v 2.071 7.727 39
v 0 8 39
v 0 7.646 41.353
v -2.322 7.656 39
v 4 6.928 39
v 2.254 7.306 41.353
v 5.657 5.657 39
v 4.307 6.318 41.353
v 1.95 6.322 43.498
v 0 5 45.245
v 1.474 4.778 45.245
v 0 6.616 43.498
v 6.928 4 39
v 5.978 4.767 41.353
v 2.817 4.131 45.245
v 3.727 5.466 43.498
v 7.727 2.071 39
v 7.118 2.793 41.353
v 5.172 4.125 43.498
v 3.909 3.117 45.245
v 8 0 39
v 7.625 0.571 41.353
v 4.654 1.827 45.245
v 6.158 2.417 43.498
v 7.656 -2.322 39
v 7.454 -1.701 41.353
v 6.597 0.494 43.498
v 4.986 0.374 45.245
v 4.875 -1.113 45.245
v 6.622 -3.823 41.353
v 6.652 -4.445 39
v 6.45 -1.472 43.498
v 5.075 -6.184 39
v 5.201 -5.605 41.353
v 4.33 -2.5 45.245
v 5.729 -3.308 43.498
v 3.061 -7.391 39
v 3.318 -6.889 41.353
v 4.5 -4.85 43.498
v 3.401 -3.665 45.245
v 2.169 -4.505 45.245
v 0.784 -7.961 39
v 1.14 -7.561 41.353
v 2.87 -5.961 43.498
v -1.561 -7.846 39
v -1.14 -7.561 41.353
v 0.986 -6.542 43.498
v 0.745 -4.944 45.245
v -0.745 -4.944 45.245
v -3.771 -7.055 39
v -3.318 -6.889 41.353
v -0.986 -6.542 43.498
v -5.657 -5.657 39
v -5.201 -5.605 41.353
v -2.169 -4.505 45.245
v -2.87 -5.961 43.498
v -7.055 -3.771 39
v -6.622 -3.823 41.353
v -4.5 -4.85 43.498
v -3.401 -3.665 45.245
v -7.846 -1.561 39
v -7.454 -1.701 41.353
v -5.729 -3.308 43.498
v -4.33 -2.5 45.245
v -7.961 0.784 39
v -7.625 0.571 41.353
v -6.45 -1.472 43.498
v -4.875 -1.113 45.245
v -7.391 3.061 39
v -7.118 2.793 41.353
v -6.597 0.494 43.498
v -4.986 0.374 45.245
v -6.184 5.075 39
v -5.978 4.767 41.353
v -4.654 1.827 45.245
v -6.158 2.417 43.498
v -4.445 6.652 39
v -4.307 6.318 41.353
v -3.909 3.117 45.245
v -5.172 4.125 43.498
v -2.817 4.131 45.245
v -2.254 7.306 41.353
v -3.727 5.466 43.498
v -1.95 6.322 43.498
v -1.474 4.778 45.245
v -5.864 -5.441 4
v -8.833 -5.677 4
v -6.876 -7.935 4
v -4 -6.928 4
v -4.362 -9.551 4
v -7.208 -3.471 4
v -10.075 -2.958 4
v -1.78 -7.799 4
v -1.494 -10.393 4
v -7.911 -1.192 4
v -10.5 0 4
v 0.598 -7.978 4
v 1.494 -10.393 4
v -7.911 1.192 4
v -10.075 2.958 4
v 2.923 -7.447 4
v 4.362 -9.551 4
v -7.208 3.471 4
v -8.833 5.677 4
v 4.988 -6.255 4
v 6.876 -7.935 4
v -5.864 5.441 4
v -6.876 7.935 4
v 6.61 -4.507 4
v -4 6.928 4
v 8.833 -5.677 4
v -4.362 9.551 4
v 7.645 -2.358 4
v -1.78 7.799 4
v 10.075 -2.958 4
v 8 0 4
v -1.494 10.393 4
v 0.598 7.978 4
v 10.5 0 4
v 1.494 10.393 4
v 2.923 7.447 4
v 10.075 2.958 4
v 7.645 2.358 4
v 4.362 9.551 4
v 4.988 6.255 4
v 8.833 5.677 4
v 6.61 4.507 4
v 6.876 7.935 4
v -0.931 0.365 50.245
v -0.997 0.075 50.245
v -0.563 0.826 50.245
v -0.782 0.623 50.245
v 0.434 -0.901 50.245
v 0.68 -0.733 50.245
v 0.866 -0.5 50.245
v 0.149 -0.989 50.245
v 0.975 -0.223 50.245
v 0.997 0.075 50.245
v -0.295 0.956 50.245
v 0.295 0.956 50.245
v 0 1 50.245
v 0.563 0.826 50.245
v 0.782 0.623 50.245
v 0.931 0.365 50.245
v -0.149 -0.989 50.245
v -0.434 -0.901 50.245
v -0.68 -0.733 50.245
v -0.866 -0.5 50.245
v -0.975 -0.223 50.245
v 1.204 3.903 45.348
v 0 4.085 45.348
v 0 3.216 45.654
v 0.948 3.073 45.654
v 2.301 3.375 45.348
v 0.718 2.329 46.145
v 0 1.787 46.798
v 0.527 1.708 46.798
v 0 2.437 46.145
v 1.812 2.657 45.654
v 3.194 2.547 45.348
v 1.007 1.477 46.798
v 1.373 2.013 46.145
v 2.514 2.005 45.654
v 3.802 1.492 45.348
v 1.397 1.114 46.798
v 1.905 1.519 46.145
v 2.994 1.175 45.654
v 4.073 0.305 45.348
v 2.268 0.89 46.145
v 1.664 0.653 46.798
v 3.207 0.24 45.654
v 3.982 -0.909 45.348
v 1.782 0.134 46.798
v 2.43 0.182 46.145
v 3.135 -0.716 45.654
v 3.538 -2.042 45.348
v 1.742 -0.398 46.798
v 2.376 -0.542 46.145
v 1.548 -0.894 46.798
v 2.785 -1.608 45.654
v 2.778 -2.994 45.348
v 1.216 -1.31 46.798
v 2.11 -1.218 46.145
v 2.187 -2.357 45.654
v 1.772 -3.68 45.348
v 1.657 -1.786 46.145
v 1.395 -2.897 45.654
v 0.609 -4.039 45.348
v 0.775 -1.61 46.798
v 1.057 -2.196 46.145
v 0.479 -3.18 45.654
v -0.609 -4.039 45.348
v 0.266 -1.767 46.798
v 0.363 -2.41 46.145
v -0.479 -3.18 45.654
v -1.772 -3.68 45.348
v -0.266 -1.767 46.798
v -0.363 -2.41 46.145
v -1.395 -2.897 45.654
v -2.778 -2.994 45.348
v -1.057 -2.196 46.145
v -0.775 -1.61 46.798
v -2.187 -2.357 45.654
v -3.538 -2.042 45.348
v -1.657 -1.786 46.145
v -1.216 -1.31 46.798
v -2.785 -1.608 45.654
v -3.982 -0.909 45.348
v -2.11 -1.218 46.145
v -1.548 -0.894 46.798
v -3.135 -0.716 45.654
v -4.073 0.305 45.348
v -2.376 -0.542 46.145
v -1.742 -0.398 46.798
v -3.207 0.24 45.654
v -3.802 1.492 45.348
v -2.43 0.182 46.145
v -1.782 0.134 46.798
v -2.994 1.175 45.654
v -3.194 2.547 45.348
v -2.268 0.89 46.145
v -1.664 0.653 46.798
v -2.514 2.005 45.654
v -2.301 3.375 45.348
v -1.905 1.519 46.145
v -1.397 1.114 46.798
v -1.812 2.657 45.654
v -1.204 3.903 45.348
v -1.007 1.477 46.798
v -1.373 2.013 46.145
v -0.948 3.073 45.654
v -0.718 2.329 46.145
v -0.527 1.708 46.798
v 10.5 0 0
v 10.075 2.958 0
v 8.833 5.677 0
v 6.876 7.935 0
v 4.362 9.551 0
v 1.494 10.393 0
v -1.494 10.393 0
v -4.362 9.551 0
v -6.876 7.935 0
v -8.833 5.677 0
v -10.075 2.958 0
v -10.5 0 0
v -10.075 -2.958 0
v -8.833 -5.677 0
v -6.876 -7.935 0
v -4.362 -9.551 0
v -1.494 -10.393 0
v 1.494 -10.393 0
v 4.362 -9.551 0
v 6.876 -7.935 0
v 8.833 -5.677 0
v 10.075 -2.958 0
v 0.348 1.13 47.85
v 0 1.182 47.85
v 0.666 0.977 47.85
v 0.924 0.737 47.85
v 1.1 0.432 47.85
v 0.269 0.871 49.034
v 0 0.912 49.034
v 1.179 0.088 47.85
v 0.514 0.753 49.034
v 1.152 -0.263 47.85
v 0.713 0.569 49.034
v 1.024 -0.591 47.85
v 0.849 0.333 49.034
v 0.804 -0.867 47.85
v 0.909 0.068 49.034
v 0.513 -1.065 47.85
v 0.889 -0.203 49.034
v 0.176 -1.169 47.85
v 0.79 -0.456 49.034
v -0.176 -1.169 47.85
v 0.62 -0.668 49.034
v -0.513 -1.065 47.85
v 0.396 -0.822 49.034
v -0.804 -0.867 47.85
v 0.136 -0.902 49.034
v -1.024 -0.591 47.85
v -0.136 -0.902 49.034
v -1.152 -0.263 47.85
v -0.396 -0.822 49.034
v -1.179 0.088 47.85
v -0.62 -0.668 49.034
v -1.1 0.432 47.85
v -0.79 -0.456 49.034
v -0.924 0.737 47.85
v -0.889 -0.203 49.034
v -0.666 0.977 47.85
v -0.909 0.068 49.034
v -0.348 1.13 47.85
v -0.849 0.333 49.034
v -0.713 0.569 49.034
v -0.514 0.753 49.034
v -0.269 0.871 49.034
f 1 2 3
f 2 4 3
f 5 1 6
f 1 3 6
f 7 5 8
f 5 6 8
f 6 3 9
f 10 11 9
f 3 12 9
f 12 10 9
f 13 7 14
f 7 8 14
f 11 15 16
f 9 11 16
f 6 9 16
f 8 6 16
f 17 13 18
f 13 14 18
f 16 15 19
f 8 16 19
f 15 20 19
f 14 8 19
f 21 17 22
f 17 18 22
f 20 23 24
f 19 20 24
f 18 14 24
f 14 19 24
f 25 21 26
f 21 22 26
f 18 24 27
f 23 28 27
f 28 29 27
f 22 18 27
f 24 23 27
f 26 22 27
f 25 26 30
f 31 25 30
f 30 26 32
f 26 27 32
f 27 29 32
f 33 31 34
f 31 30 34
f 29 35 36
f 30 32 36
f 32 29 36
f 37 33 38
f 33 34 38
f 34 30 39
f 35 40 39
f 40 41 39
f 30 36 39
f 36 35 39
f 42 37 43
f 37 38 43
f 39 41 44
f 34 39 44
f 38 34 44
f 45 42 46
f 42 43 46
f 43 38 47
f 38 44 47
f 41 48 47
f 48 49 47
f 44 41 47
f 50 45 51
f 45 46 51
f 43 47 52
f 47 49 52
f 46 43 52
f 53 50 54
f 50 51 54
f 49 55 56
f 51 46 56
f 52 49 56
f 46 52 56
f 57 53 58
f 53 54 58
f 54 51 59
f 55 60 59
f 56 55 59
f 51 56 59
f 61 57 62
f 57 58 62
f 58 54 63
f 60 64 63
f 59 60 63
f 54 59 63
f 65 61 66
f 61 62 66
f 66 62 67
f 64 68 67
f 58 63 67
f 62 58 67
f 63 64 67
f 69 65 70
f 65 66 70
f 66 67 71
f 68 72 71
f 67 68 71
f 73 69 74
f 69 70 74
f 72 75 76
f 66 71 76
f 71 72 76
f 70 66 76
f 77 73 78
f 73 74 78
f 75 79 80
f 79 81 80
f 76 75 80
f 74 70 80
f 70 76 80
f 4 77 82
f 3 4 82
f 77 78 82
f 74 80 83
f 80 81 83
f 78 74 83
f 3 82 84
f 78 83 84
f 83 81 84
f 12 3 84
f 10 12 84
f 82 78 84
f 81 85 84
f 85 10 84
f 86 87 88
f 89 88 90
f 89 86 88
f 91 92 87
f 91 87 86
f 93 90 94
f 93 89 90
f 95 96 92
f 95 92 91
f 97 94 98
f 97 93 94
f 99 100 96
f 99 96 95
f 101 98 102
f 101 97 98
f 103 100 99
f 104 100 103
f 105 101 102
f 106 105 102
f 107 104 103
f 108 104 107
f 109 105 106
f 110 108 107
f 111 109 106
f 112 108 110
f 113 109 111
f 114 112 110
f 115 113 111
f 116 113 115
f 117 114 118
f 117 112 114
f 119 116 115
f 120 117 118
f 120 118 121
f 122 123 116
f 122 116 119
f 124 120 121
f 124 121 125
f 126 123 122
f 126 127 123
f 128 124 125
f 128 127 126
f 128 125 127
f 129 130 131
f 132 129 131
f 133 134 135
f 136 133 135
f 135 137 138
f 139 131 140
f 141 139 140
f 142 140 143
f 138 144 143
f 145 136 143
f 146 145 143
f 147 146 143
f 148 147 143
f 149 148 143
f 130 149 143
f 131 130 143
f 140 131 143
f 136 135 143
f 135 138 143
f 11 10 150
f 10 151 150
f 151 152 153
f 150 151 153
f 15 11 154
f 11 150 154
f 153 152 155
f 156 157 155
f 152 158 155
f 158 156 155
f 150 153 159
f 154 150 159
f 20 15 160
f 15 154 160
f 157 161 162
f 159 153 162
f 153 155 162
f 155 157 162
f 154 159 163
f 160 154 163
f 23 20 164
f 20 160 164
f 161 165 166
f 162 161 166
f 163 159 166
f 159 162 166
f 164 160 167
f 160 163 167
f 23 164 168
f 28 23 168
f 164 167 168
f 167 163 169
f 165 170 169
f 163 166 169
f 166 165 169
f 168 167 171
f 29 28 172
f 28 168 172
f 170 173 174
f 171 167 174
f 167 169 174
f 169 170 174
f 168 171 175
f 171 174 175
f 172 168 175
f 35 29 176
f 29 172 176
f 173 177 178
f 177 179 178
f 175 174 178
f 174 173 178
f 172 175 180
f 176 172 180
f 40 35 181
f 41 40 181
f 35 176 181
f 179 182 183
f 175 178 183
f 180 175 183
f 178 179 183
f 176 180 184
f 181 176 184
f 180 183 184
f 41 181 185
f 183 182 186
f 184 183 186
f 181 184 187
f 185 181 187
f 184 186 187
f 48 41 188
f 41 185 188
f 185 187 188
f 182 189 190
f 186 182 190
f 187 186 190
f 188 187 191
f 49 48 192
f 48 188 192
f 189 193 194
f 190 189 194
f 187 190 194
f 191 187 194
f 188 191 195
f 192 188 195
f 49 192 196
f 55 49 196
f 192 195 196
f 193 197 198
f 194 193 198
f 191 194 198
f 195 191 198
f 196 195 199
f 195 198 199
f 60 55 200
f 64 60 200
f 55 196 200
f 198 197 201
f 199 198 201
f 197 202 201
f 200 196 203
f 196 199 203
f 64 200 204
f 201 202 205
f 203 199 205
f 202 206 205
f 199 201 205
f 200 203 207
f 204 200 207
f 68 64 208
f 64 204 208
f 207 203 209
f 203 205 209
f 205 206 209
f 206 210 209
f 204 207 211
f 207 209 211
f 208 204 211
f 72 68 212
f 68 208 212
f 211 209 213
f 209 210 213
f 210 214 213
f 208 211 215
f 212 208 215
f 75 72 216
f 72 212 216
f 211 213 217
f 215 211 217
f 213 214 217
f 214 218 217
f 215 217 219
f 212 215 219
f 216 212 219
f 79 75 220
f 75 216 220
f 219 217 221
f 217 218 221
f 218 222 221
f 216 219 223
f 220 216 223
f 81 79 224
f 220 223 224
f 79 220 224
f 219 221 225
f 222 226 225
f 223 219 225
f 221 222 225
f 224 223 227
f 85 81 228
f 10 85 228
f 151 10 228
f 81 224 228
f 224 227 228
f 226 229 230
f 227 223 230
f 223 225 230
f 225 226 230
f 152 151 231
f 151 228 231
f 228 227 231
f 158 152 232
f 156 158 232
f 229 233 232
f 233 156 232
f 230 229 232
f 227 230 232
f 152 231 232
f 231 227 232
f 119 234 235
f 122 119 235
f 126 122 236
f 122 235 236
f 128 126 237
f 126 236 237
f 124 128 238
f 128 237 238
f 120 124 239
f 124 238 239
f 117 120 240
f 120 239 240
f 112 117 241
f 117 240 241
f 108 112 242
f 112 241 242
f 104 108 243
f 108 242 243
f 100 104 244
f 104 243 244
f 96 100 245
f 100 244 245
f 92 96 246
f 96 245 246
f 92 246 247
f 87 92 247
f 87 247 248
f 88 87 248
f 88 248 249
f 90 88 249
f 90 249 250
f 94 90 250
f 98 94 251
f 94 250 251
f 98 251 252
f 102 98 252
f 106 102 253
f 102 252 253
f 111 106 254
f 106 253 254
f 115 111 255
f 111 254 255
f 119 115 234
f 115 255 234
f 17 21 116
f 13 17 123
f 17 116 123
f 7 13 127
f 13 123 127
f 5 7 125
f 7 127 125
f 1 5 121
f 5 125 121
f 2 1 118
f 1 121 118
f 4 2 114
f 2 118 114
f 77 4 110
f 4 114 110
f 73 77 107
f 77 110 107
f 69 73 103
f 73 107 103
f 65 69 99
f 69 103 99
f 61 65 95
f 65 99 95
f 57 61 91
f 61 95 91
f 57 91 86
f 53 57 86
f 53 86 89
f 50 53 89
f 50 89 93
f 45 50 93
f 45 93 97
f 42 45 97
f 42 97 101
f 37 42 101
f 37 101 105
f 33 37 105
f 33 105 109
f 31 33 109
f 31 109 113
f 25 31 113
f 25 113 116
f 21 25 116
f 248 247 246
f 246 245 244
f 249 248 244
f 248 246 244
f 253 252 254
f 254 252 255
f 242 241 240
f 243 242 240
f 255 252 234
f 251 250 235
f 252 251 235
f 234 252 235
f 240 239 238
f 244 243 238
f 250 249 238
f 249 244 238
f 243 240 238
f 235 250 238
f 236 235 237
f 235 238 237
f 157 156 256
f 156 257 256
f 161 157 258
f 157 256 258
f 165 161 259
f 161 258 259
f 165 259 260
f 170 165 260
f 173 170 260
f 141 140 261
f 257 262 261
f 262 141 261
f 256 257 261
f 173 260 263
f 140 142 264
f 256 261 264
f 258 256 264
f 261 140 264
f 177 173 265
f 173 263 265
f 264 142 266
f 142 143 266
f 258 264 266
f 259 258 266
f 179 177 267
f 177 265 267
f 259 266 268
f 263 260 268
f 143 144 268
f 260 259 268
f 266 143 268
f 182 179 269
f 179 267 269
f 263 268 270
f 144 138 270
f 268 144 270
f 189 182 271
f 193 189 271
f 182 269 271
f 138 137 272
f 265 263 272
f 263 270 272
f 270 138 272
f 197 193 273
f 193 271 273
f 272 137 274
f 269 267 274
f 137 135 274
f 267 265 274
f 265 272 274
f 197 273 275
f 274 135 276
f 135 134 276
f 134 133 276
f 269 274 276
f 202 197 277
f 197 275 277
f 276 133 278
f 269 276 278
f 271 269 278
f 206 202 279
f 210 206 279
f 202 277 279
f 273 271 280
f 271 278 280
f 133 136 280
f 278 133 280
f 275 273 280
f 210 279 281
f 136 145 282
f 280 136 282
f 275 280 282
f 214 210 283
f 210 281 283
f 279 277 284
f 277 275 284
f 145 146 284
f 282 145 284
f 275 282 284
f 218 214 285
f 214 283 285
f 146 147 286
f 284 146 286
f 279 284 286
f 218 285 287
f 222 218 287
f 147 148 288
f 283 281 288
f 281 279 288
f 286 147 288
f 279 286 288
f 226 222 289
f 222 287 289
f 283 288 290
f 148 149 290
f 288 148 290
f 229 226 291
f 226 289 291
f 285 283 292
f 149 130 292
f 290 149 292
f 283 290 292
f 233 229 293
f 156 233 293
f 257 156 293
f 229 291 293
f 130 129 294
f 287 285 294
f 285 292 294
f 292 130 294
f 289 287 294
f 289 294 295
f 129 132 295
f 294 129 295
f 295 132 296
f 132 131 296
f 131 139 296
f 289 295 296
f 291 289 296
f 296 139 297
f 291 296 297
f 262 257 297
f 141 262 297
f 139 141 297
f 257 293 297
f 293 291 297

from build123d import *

# Parameters (mm, degrees)
F0_R     = 10.5
F1_DEPTH = 4
F2_R     = 8
F3_DEPTH = 39


with BuildPart() as f1:
    # F0 (on Top) → F1 (new body)
    with BuildSketch(Plane.XY):
        Circle(F0_R)
    extrude(amount=F1_DEPTH)

    # F2 (on Top) → F3 (join)
    with BuildSketch(Plane.XY):
        Circle(F2_R)
    extrude(amount=F3_DEPTH)

    # F4 (on Right) → F5 (revolve)
    with BuildSketch(Plane.YZ):
        with BuildLine():
            Line((5, 45.244998), (0, 45.244998))
            Line((0, 45.244998), (0, 39))
            Line((0, 39), (8, 39))
            ThreePointArc((8, 39), (7.211103, 42.464102), (5, 45.244998))
        make_face()
        with BuildLine():
            Line((0, 50.244998), (0, 47))
            ThreePointArc((0, 47), (0.899322, 46.949291), (1.787243, 46.797805))
            ThreePointArc((1.787243, 46.797805), (1.002907, 48.432173), (1, 50.244998))
            Line((1, 50.244998), (0, 50.244998))
        make_face()
        with BuildLine():
            ThreePointArc((1.787243, 46.797805), (0.899322, 46.949291), (0, 47))
            Line((0, 47), (0, 45.244998))
            Line((0, 45.244998), (5, 45.244998))
            ThreePointArc((5, 45.244998), (3.215832, 45.653556), (1.787243, 46.797805))
        make_face()
    revolve(axis=Axis((0, 0, 43), (0, 0, -1)))


solid = f1.part
